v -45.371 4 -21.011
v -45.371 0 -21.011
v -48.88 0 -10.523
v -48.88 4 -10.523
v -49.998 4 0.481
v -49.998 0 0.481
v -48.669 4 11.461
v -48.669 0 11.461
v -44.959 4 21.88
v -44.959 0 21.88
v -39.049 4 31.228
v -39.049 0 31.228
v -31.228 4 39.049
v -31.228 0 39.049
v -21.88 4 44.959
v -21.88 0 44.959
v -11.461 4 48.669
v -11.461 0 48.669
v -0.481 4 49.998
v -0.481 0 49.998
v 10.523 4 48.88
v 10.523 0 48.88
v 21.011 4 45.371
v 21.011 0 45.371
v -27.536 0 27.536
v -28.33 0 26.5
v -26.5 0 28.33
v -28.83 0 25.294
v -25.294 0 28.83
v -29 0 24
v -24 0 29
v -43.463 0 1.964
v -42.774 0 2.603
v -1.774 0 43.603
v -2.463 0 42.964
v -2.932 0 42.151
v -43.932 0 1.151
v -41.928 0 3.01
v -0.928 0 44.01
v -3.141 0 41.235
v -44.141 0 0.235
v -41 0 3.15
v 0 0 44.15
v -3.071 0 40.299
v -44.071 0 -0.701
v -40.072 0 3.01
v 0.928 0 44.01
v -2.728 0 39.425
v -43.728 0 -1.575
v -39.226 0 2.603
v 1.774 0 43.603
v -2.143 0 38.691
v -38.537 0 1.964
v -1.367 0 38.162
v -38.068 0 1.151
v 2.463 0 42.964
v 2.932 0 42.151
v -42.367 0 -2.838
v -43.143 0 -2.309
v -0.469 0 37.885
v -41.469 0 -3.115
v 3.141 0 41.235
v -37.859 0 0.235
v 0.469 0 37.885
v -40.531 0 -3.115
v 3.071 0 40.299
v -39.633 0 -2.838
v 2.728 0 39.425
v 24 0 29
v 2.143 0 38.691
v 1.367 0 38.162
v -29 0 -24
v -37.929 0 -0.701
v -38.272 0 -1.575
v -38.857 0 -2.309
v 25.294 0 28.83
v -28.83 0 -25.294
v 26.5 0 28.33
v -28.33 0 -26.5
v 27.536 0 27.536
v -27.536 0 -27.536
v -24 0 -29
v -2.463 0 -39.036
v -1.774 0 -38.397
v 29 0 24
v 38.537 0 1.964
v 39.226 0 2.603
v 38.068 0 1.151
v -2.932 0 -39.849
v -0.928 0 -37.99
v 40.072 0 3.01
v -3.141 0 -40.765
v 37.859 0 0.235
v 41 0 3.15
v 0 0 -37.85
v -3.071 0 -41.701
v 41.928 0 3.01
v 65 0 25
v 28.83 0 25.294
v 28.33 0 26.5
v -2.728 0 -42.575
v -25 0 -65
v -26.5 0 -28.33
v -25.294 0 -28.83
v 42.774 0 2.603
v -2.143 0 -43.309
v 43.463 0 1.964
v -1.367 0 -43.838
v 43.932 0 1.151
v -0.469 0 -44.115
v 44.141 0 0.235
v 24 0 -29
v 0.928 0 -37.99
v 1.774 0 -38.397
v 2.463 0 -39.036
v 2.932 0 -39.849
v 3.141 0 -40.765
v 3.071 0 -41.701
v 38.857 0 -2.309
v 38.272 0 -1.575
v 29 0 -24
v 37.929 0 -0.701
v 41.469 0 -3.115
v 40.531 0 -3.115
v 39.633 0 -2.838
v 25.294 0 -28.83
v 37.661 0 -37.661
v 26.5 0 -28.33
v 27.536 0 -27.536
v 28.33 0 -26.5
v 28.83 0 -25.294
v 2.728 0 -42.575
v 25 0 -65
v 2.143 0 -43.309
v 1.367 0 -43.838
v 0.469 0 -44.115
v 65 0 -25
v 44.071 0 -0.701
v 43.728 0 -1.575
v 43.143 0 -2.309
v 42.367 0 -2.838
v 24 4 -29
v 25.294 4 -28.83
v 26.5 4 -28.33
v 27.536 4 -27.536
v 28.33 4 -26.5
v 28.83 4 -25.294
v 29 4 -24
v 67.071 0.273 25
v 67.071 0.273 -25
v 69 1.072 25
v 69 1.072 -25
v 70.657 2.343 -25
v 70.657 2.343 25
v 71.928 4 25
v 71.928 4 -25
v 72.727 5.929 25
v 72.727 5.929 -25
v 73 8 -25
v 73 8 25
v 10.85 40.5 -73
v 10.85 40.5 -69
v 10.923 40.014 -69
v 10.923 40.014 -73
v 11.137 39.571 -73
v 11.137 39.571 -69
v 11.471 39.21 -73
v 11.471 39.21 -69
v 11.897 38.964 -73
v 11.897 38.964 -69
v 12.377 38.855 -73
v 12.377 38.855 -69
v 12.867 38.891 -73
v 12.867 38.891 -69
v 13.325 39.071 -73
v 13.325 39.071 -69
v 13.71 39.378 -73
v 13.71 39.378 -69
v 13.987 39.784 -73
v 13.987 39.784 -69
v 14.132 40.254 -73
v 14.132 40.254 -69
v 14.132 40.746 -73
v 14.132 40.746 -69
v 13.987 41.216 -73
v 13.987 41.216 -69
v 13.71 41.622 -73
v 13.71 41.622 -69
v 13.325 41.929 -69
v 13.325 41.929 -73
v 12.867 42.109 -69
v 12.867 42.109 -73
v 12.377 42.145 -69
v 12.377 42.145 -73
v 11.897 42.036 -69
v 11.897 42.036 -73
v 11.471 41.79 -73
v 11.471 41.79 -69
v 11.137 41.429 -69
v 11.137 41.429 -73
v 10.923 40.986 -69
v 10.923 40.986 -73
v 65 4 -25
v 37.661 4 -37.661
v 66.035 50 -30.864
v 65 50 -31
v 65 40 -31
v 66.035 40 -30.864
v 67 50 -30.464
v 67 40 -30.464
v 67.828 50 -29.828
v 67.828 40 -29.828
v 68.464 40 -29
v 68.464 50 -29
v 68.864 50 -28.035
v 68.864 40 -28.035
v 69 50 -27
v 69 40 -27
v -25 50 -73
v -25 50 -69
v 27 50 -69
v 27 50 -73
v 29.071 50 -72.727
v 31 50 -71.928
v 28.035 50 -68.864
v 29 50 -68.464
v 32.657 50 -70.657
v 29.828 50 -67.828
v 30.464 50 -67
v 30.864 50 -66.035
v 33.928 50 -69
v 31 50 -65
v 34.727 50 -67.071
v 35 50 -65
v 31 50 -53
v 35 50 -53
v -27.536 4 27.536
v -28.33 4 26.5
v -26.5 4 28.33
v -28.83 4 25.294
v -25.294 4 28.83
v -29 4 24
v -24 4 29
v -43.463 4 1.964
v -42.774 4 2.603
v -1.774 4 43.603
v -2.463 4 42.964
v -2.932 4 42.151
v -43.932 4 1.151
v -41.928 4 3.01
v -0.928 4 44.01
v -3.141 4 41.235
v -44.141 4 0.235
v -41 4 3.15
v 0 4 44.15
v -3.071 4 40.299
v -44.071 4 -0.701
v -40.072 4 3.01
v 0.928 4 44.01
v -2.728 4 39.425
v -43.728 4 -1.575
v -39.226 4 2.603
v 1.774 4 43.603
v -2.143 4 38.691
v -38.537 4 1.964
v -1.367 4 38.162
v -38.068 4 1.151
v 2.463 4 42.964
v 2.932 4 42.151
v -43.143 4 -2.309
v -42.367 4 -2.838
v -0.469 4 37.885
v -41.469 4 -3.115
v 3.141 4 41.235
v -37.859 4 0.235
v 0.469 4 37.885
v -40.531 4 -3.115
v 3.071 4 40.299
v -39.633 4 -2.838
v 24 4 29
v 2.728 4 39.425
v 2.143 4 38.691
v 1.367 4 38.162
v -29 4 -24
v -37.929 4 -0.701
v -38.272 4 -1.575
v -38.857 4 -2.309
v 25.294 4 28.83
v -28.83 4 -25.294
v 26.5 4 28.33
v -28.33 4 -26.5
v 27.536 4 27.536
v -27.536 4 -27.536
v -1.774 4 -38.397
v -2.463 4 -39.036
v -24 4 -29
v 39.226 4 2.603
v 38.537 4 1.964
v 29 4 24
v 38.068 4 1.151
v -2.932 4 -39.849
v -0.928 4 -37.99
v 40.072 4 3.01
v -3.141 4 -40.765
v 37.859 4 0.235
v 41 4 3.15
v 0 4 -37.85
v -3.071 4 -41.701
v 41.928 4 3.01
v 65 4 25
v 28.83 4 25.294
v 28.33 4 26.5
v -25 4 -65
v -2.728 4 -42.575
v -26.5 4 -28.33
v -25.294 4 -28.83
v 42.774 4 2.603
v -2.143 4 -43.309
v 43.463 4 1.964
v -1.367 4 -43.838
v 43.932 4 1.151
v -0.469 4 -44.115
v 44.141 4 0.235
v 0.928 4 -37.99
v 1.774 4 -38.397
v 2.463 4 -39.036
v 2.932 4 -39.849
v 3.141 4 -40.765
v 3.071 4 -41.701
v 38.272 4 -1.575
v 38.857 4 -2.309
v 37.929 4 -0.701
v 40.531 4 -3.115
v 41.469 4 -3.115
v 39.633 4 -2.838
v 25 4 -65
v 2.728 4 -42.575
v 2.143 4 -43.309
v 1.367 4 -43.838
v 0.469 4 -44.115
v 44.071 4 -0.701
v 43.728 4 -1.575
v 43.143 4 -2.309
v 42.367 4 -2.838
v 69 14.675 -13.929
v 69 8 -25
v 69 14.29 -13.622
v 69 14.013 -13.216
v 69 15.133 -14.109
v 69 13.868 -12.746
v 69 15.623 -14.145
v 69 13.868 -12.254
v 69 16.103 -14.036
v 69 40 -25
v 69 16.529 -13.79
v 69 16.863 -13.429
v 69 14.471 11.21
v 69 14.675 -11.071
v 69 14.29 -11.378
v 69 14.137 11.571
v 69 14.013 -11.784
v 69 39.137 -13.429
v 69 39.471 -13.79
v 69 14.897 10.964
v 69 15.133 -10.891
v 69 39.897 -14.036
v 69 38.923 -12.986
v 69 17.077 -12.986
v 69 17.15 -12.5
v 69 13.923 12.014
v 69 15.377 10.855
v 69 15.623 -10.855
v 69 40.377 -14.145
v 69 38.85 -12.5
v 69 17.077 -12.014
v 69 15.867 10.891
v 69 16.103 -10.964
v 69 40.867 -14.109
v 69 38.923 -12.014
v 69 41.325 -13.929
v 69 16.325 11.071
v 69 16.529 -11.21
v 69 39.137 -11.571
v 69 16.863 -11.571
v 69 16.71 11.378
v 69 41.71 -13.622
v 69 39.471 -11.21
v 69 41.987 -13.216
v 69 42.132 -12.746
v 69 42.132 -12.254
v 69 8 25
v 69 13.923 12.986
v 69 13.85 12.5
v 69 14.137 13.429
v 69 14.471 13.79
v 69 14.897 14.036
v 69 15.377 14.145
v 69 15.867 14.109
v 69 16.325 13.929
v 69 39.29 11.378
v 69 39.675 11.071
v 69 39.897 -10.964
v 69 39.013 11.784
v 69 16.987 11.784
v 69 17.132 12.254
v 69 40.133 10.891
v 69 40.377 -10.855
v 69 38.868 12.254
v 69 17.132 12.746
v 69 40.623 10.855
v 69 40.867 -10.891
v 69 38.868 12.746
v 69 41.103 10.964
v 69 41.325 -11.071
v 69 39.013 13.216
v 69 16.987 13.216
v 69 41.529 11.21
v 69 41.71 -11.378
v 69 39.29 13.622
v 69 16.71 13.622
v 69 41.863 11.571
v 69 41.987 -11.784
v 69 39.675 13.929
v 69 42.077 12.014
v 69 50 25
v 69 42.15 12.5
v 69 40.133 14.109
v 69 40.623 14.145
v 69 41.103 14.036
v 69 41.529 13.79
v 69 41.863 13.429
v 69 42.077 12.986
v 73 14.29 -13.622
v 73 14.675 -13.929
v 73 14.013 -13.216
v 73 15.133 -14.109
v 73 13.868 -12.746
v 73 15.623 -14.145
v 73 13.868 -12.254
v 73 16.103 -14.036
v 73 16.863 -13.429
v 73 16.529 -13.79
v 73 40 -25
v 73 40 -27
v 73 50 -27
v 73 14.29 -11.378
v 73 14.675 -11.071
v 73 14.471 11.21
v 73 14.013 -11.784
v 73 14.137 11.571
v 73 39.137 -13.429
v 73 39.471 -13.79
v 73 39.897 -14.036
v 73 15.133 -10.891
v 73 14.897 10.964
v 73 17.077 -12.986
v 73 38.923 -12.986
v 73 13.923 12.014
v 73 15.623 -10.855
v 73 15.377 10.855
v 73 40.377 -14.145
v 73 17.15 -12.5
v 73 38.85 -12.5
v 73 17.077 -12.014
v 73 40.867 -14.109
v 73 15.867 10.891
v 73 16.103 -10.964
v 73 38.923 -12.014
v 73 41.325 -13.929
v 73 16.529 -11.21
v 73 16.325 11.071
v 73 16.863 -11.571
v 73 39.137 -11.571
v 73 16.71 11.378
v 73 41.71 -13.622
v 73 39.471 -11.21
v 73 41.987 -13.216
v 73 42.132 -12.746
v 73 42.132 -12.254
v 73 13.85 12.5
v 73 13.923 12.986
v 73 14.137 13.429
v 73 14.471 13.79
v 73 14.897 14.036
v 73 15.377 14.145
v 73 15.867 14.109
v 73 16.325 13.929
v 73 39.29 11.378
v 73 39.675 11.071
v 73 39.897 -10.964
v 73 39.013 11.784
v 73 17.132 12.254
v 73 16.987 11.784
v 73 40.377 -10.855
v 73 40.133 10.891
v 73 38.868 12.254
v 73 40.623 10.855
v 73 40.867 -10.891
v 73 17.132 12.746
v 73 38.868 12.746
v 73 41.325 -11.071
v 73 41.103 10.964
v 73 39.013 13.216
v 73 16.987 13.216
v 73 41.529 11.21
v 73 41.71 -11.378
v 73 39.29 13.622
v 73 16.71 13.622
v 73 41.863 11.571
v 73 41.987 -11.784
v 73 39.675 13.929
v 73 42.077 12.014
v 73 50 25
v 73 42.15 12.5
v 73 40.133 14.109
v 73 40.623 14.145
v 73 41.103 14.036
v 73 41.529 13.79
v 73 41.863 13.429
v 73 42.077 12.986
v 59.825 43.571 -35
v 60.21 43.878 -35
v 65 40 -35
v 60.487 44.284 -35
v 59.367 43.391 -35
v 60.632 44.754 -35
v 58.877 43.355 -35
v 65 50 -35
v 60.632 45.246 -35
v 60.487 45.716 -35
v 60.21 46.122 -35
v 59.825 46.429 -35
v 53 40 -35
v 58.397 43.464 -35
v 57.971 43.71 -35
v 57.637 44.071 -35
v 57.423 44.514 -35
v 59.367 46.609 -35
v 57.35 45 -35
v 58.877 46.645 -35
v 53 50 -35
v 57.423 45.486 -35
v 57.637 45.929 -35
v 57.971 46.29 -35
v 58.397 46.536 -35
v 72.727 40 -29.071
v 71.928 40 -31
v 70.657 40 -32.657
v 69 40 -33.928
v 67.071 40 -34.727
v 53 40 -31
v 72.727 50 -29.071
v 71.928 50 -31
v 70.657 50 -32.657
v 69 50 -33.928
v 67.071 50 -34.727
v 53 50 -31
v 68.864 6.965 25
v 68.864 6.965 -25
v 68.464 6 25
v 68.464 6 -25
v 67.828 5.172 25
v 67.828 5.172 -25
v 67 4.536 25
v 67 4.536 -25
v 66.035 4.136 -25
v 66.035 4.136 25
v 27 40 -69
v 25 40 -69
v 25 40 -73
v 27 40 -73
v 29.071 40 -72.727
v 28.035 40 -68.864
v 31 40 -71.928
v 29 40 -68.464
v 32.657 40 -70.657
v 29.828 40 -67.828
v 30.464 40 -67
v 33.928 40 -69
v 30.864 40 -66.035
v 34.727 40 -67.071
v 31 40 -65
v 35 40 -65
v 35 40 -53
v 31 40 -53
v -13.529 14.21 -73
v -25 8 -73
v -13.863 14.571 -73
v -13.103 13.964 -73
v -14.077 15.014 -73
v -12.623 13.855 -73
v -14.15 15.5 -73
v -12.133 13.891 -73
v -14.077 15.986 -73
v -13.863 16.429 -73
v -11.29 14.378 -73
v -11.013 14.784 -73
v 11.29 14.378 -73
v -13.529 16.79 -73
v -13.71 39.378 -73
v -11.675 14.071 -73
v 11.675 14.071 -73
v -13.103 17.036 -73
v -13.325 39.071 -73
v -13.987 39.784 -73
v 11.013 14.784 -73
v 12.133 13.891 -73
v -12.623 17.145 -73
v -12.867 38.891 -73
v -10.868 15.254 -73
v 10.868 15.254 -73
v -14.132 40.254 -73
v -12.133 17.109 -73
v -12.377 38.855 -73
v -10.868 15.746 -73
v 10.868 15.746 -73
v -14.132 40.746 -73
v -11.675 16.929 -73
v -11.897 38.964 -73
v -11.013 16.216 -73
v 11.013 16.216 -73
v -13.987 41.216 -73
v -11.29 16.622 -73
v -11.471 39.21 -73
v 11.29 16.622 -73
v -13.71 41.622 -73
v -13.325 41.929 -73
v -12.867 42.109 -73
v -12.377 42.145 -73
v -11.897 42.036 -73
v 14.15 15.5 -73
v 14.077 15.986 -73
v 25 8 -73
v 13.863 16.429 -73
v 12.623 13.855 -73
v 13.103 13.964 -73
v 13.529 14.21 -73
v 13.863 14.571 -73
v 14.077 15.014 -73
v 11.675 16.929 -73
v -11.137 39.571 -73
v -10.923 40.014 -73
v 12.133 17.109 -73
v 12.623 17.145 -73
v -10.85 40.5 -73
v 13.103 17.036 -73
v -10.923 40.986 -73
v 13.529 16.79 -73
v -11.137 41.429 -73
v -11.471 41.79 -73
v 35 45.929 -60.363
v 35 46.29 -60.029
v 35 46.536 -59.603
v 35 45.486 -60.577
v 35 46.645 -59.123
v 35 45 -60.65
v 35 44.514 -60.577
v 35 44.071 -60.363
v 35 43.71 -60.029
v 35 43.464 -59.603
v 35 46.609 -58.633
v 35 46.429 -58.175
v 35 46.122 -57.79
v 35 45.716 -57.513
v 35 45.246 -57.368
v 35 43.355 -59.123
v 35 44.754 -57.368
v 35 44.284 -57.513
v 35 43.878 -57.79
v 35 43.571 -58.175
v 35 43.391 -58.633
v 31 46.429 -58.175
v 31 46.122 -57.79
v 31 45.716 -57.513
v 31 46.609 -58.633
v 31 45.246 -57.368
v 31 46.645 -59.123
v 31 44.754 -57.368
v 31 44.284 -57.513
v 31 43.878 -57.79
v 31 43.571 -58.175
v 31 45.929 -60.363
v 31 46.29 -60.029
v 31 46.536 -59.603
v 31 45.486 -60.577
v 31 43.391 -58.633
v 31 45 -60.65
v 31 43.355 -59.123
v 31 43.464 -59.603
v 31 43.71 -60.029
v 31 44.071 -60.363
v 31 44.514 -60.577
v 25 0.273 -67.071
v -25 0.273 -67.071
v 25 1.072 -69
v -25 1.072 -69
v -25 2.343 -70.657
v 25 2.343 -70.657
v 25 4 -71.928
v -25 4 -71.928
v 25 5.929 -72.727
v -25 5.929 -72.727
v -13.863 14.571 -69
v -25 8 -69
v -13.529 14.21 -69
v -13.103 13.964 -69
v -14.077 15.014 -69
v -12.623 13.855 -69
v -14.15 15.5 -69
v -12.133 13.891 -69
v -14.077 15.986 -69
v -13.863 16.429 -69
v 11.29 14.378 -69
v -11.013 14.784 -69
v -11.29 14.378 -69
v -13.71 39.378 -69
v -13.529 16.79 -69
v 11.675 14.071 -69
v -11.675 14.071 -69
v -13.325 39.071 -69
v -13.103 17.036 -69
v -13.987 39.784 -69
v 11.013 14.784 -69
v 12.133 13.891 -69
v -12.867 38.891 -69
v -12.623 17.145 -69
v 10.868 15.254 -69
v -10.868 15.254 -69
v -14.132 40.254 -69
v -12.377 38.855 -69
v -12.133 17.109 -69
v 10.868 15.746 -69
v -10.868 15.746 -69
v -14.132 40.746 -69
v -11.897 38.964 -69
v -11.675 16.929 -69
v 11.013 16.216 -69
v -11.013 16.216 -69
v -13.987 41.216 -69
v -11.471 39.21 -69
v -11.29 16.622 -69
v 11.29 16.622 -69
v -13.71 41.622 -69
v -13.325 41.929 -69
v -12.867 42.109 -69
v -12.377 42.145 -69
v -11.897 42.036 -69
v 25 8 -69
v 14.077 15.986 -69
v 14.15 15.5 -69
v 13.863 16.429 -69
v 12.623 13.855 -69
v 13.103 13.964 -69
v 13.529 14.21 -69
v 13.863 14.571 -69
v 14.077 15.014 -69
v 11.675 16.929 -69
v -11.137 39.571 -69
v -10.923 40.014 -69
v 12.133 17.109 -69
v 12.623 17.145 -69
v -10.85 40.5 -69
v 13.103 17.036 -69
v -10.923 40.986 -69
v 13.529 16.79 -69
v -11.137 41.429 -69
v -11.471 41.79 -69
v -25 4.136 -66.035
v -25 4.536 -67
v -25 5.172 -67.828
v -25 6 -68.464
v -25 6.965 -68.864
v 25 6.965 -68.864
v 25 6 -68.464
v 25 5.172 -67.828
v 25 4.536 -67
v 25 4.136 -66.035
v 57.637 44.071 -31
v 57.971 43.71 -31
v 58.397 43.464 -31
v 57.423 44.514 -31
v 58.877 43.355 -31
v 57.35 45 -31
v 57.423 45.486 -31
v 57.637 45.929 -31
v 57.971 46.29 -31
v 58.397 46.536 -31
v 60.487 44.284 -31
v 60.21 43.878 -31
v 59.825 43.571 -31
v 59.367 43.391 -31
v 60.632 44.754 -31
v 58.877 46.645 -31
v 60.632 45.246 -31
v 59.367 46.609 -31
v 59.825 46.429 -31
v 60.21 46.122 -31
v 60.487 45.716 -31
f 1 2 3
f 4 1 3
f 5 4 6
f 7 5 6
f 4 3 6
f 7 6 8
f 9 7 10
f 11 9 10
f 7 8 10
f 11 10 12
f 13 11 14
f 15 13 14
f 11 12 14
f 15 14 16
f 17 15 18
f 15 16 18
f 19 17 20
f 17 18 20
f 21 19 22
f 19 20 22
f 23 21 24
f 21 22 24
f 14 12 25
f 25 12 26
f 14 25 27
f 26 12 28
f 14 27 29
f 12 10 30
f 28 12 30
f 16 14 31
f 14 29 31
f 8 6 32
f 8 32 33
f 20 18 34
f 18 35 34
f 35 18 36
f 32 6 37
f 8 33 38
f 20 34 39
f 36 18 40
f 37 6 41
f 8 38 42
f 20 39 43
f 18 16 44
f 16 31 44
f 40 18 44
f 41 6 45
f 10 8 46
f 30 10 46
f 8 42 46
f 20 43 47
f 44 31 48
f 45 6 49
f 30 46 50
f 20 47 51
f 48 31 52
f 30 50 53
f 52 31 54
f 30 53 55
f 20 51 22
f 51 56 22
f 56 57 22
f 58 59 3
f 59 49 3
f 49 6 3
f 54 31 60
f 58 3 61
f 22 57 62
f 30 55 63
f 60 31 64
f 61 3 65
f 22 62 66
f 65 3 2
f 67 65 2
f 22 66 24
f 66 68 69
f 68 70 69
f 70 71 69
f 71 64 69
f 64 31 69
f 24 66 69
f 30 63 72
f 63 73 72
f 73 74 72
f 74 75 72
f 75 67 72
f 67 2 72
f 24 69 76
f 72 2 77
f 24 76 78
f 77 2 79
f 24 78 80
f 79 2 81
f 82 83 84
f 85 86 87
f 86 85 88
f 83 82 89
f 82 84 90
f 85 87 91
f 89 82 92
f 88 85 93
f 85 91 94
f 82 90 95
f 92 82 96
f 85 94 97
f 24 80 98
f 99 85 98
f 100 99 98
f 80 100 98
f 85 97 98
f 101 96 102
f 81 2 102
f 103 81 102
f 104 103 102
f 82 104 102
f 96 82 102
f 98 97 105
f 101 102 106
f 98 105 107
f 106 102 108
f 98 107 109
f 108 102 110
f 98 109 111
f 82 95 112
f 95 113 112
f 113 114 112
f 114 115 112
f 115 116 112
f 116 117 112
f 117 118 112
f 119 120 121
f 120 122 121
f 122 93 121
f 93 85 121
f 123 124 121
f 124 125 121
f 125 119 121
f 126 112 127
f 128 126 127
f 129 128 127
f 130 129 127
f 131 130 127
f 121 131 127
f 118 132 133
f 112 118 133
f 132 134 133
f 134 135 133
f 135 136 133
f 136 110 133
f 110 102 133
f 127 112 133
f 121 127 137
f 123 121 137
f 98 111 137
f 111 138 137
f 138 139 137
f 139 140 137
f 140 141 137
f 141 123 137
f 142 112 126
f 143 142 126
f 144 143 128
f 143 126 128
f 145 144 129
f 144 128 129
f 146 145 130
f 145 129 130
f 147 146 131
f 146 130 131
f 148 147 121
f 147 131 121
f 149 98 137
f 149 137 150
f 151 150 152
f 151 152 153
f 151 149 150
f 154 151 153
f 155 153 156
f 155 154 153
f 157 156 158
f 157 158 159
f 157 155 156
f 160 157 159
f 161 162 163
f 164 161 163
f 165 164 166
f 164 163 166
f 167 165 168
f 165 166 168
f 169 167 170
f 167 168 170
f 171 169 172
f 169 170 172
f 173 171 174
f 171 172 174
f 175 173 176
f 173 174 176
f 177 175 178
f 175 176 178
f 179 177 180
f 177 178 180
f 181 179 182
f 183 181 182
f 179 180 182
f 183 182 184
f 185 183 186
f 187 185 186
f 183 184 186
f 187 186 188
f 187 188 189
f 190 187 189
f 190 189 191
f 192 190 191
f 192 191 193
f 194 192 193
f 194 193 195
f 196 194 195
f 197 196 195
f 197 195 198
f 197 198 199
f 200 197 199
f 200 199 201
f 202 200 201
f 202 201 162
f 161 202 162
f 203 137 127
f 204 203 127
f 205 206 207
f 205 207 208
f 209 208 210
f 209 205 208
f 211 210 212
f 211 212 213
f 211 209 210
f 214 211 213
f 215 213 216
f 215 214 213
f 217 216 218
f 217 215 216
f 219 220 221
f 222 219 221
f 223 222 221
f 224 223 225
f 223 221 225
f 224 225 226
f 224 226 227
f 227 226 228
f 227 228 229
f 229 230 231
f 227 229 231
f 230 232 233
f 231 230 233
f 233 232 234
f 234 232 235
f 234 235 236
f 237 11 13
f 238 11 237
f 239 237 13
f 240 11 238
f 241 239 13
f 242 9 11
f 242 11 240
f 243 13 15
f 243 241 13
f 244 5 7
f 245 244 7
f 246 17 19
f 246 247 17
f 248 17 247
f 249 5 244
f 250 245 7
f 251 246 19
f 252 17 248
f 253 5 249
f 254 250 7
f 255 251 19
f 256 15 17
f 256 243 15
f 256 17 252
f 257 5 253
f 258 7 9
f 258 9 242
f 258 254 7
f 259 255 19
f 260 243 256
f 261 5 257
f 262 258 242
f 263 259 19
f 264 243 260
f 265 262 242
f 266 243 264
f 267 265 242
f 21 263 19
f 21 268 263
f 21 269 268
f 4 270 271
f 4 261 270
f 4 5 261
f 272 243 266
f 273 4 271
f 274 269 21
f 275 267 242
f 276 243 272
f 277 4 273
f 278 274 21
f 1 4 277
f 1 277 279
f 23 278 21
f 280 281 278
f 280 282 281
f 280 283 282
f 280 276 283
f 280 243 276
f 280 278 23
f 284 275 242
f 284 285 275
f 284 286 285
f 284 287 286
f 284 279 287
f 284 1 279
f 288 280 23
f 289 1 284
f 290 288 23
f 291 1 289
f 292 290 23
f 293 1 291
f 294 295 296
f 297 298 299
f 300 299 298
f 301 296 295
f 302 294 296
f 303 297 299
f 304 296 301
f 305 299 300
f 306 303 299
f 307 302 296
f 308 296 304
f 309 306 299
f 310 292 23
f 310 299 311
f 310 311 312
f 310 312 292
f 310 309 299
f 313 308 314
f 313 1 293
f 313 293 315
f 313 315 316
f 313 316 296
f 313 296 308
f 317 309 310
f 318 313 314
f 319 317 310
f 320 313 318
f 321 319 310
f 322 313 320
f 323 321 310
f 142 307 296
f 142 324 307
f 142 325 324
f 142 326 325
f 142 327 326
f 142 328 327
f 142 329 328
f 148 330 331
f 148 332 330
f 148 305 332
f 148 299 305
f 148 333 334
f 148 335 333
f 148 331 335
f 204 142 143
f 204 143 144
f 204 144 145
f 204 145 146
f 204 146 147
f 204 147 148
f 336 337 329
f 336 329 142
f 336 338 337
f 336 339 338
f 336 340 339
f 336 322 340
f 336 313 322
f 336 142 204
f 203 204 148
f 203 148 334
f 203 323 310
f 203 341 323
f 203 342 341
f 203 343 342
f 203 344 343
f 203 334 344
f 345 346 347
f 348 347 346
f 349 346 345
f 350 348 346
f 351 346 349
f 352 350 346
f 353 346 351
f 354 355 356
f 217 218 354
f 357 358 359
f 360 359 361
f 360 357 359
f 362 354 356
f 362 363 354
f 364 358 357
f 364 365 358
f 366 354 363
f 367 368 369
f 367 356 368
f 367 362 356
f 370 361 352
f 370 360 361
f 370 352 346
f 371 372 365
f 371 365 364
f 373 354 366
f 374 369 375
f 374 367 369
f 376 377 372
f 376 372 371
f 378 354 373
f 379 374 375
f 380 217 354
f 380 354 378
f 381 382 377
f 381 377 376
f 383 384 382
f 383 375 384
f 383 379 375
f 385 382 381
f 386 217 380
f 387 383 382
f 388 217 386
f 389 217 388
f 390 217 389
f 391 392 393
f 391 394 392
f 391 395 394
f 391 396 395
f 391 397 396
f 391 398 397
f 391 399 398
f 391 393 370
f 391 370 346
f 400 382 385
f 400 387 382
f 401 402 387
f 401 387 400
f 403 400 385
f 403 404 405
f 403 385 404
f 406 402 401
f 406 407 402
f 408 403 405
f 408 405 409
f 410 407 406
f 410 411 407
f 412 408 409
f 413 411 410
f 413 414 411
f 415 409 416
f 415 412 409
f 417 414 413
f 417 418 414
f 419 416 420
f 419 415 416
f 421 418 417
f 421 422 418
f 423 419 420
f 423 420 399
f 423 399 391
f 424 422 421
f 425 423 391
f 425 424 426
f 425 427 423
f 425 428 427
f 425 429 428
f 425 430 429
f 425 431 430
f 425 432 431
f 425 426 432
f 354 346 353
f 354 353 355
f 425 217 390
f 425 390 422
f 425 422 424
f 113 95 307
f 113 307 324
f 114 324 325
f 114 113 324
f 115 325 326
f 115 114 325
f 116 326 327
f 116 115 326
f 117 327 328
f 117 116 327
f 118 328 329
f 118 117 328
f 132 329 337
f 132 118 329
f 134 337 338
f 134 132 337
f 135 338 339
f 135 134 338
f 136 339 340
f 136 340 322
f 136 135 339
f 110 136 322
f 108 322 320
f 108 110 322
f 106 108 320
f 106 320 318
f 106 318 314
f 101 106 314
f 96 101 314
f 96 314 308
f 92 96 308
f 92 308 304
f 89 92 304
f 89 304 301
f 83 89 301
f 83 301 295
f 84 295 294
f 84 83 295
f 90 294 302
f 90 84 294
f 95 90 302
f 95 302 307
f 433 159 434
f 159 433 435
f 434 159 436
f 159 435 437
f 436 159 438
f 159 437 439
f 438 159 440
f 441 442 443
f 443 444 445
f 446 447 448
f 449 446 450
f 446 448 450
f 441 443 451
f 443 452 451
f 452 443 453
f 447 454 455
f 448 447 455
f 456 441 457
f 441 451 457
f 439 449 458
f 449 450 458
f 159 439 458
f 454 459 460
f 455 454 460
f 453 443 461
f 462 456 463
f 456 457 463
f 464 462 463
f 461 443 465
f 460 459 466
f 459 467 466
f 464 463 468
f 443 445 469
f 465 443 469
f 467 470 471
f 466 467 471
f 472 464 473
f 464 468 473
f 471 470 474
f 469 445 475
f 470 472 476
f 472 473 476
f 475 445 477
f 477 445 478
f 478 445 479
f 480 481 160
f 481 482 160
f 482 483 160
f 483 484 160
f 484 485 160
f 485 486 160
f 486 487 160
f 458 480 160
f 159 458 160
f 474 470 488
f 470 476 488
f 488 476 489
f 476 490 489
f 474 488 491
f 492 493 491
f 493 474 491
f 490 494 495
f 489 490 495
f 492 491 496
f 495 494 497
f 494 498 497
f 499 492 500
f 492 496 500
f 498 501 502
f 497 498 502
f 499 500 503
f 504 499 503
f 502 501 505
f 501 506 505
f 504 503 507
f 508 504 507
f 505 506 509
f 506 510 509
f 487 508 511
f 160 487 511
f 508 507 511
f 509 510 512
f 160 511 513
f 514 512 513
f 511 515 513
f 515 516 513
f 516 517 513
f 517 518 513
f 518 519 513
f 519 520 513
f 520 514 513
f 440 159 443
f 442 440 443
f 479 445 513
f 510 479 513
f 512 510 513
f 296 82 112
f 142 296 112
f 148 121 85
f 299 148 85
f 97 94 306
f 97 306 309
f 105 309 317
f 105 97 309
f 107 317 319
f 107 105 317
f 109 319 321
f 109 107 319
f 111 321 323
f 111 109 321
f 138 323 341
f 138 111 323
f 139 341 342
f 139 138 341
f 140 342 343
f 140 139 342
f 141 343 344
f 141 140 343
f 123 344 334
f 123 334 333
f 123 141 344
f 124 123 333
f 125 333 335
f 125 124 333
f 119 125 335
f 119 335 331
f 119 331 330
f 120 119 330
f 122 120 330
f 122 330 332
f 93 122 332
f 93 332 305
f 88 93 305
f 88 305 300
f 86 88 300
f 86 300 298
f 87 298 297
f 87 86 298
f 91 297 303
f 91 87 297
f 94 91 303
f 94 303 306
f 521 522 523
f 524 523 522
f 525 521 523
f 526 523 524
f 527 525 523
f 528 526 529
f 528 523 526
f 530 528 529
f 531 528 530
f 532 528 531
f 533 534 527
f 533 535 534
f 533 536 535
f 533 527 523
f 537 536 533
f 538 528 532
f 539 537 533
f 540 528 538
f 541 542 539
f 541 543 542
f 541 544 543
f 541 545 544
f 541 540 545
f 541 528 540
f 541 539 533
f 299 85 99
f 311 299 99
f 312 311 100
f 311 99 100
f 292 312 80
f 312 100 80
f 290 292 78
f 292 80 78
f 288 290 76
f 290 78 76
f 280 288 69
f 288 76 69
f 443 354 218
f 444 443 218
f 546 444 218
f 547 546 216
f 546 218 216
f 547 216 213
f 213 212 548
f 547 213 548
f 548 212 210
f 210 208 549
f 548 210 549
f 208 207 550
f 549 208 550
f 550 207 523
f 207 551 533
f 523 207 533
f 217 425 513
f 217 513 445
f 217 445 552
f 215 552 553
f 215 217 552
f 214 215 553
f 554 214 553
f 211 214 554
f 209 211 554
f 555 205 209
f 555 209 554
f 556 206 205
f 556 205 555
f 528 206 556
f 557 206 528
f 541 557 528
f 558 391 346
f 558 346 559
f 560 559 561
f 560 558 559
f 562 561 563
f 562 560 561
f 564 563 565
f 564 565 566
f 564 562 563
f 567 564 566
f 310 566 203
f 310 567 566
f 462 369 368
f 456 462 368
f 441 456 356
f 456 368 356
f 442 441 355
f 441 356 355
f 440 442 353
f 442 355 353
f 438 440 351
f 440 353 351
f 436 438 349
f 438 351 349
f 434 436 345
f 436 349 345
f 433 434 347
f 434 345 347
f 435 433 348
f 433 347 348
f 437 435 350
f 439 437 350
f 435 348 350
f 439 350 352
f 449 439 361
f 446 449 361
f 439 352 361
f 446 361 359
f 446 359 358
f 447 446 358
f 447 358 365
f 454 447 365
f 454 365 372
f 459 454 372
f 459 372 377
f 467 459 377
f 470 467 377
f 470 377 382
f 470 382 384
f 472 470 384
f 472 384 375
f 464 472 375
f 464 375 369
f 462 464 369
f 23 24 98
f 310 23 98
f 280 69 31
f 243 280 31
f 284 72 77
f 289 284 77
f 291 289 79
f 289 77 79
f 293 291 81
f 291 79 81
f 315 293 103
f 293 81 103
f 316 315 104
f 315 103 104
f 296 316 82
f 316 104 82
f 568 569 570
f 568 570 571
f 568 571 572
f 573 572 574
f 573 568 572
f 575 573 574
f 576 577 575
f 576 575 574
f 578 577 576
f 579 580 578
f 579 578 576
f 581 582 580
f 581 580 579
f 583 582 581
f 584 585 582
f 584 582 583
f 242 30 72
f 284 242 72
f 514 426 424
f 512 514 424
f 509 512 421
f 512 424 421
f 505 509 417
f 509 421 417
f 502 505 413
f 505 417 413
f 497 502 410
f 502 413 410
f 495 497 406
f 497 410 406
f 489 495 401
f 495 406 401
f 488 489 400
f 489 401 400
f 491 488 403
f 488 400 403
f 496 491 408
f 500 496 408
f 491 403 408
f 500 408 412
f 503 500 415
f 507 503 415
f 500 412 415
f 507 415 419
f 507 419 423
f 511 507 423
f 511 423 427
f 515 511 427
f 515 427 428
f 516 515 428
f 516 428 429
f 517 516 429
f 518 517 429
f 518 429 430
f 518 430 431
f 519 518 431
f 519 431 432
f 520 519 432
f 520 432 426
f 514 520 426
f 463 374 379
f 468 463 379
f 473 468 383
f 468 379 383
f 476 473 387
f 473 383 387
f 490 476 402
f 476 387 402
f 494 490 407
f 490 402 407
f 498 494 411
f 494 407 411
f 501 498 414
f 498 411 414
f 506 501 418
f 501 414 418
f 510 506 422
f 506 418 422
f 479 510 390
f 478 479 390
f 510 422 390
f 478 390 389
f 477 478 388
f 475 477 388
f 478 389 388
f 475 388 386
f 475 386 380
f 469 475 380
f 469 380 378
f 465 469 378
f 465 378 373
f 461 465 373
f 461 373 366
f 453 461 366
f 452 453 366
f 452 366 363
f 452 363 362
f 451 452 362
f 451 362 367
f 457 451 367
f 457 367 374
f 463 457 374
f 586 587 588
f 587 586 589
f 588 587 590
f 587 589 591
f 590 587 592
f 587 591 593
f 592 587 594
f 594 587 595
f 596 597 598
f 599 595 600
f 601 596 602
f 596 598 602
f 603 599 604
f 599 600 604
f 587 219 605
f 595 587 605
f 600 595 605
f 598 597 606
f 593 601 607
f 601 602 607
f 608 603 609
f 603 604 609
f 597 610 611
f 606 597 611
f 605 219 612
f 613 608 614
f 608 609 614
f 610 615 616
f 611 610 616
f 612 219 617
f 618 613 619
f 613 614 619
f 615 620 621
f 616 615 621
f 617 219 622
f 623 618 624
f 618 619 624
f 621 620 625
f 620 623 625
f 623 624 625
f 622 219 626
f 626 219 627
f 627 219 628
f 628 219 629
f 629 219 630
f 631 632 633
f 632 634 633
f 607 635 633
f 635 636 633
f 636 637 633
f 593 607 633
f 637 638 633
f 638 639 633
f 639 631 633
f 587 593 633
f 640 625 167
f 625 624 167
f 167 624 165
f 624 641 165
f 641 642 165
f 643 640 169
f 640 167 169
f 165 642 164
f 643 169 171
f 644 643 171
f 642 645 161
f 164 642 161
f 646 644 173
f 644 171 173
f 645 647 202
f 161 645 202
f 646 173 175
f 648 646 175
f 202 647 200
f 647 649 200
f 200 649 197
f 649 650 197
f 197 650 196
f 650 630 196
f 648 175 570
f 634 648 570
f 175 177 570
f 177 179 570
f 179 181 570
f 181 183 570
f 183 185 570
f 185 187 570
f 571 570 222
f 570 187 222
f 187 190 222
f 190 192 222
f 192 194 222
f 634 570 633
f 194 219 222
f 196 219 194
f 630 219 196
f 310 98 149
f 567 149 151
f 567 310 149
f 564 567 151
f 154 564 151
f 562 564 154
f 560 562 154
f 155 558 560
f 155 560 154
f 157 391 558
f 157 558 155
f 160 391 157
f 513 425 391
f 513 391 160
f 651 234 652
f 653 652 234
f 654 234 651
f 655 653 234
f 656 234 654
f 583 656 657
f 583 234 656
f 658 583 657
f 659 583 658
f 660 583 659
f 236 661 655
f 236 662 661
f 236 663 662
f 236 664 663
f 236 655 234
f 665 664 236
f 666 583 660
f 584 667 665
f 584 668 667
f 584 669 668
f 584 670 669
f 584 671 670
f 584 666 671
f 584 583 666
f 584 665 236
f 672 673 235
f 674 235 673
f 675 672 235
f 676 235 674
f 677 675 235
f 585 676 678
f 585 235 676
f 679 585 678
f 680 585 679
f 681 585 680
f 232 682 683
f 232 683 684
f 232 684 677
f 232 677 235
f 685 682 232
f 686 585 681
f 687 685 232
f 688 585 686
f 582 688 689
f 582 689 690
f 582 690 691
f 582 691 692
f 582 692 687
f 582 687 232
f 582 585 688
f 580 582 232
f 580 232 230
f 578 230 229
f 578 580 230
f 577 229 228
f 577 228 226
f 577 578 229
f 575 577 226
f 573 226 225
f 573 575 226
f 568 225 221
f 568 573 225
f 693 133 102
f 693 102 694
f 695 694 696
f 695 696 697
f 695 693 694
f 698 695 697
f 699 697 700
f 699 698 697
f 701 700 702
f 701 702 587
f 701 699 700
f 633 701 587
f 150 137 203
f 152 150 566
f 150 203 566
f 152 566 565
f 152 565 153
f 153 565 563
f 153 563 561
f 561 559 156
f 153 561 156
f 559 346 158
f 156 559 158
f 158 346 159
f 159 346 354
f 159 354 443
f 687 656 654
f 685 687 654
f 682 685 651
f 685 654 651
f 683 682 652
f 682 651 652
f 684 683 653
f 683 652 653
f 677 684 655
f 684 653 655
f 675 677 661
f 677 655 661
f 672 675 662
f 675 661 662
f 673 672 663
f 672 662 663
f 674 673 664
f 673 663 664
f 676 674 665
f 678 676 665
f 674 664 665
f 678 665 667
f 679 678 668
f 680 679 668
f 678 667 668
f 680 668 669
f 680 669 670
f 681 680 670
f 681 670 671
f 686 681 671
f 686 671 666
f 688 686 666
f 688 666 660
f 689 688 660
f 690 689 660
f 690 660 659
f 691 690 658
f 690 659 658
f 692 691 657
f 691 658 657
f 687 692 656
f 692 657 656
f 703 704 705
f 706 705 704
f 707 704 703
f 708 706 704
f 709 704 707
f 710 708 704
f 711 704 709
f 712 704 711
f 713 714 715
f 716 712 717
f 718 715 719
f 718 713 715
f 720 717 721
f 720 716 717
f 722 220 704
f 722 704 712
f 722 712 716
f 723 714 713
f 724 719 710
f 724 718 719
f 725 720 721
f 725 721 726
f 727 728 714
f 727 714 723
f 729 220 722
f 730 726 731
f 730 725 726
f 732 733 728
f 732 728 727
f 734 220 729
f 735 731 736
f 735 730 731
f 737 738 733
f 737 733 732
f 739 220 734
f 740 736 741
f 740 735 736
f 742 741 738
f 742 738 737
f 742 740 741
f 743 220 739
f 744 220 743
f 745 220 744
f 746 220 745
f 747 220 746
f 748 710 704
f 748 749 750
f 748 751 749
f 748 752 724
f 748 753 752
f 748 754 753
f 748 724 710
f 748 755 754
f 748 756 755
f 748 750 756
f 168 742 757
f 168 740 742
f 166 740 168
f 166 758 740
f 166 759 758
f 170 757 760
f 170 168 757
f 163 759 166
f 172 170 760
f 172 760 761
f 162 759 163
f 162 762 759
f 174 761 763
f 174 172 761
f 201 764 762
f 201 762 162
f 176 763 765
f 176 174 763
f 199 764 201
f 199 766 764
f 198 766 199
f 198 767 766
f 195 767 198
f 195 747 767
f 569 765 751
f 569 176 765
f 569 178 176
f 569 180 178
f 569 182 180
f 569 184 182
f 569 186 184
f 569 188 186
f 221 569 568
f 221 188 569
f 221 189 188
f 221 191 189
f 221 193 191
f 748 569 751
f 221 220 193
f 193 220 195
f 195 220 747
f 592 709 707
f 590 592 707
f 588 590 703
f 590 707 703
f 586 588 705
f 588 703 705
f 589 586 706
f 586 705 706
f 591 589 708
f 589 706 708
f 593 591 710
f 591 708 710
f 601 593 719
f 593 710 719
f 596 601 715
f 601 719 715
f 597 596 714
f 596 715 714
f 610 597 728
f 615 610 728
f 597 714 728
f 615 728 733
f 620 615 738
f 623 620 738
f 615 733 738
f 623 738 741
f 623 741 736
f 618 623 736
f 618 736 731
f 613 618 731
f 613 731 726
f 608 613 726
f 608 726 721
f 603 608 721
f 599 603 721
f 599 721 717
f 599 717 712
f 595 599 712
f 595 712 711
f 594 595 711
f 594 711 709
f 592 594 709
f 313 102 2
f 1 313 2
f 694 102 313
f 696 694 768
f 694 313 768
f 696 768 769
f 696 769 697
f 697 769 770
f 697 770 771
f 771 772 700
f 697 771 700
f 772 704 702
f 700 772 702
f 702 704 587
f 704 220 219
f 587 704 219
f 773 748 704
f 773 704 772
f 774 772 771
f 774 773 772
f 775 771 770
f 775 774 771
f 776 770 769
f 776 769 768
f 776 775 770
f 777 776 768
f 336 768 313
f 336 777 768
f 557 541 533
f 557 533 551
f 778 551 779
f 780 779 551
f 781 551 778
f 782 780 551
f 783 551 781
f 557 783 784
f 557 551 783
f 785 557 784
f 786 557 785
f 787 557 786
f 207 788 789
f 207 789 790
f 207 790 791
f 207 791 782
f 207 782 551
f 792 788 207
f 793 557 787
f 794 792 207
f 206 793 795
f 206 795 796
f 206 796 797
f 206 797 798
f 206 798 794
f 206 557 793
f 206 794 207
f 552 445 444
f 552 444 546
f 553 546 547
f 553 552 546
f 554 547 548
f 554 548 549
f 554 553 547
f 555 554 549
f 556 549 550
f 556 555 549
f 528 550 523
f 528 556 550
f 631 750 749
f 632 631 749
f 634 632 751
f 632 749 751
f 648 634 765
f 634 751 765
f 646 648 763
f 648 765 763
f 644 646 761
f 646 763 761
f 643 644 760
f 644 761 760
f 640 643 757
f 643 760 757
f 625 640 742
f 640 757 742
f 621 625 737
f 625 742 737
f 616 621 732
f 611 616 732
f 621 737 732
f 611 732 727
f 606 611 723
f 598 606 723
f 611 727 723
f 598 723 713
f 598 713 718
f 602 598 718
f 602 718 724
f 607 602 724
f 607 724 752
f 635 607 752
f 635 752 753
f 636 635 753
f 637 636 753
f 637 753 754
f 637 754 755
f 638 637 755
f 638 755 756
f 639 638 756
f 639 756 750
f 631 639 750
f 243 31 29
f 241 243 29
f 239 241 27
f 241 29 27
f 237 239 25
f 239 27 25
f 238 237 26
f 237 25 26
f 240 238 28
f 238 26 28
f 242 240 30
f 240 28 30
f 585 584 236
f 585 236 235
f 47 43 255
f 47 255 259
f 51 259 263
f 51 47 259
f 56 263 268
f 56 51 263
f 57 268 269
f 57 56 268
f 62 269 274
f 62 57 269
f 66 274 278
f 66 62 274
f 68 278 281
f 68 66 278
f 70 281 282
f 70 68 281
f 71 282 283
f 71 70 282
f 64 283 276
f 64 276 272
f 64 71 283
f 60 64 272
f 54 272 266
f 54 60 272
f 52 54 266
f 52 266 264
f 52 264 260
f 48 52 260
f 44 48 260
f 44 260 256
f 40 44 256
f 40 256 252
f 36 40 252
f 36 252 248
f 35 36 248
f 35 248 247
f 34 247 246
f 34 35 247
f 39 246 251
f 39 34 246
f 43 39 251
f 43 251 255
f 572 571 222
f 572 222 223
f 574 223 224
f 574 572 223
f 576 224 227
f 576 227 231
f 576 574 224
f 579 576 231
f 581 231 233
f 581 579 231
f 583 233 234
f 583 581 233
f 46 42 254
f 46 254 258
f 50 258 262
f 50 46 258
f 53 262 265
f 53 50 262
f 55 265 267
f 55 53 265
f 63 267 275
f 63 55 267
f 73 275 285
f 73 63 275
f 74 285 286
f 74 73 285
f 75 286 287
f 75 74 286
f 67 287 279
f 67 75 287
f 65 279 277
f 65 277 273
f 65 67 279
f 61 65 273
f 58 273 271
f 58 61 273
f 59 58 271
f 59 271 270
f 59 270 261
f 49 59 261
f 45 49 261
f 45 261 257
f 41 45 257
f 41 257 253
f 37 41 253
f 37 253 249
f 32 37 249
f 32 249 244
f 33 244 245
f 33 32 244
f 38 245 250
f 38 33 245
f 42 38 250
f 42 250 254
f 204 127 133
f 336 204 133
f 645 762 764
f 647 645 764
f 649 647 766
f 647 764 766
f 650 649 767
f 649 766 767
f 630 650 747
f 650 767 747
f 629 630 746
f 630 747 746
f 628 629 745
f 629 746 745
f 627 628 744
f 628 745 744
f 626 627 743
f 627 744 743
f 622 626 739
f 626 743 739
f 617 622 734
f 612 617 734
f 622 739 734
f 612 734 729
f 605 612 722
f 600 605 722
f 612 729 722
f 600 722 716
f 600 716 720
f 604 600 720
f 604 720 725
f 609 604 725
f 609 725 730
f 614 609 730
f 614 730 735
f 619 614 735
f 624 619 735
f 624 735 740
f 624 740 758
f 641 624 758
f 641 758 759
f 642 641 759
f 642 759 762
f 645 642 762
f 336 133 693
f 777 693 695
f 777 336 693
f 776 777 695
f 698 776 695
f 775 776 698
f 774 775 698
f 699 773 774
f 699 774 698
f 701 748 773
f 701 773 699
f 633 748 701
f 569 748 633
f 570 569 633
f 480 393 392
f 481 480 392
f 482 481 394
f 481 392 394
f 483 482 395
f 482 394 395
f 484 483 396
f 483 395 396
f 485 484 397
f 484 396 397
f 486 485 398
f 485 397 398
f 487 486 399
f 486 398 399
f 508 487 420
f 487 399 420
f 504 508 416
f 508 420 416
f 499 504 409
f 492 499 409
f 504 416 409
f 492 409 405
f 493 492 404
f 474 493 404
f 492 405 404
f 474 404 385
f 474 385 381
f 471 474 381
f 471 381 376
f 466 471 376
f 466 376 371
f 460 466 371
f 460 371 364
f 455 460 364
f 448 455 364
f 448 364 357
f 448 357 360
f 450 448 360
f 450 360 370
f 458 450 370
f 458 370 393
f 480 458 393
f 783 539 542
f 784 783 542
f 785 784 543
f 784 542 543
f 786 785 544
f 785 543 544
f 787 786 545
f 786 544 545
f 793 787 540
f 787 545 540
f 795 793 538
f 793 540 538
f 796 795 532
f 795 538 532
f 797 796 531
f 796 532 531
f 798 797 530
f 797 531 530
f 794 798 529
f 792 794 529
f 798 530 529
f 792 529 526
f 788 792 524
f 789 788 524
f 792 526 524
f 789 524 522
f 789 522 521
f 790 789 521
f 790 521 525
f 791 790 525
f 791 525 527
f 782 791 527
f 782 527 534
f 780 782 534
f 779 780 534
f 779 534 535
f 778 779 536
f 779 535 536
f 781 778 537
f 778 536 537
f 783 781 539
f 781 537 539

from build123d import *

# Parameters (mm, degrees)
SKETCH_1_R                         = 3.15
EXTRUDE_1_DEPTH                    = 4
SM_EDGE_FLANGE_1_DEPTH             = 50
SM_EDGE_FLANGE_1_BEND_DEPTH        = 50
SKETCH_25_W                        = 10
SKETCH_25_H                        = 10
EXTRUDE_3_DEPTH                    = 4
SKETCH_23_W                        = 10
SKETCH_23_H                        = 10
EXTRUDE_2_DEPTH                    = 4
SKETCH_21_R                        = 1.65
CUT_EXTRUDE_1_DEPTH                = 149.290255917
SKETCH_22_R                        = 1.65
CUT_EXTRUDE_2_DEPTH                = 149.290255917
SM_EDGE_FLANGE_2_STRIP_W           = 24
SM_EDGE_FLANGE_2_STRIP_H           = 4
SM_EDGE_FLANGE_2_STRIP_CUT_DEPTH   = 10
SM_EDGE_FLANGE_2_STRIP_2_W         = 24
SM_EDGE_FLANGE_2_STRIP_2_H         = 4
SM_EDGE_FLANGE_2_STRIP_CUT_2_DEPTH = 10
SM_EDGE_FLANGE_2_DEPTH             = 10
SM_EDGE_FLANGE_2_BEND_DEPTH        = 10
SKETCH_38_R                        = 1.65
CUT_EXTRUDE_3_DEPTH                = 4
SKETCH_37_R                        = 1.65
CUT_EXTRUDE_4_DEPTH                = 4


# Sheet-metal steps are written as plain solids
with BuildPart() as part:
    # Sketch 1 → 凸台-拉伸1 (new body)
    with BuildSketch(Plane(origin=(0, 0, 0), x_dir=(1, 0, 0), z_dir=(0, 1, 0))):
        with BuildLine():
            Line((-25, 65), (-45.371050591, 21.011134388))
            ThreePointArc((-45.371050591, 21.011134388), (-35.355339059, -35.355339059), (21.011134388, -45.371050591))
            Line((21.011134388, -45.371050591), (65, -25))
            Line((65, -25), (65, 25))
            Line((65, 25), (37.660706721, 37.660706721))
            Line((37.660706721, 37.660706721), (25, 65))
            Line((25, 65), (-25, 65))
        make_face()
        with Locations(Location((0, 41, 0), (0, 0, 270))):
            Circle(SKETCH_1_R, mode=Mode.SUBTRACT)
        with Locations(Location((0, -41, 0), (0, 0, 270))):
            Circle(SKETCH_1_R, mode=Mode.SUBTRACT)
        with Locations(Location((-41, 0, 0), (0, 0, 270))):
            Circle(SKETCH_1_R, mode=Mode.SUBTRACT)
        with BuildLine():
            ThreePointArc((29, -24), (27.535533906, -27.535533906), (24, -29))
            Line((24, -29), (-24, -29))
            ThreePointArc((-24, -29), (-27.535533906, -27.535533906), (-29, -24))
            Line((-29, -24), (-29, 24))
            ThreePointArc((-29, 24), (-27.535533906, 27.535533906), (-24, 29))
            Line((-24, 29), (24, 29))
            ThreePointArc((24, 29), (27.535533906, 27.535533906), (29, 24))
            Line((29, 24), (29, -24))
        make_face(mode=Mode.SUBTRACT)
        with Locations(Location((41, 0, 0), (0, 0, 270))):
            Circle(SKETCH_1_R, mode=Mode.SUBTRACT)
    extrude(amount=EXTRUDE_1_DEPTH)

    # 边线-法兰1 section (across the edge) → 边线-法兰1 (add)
    with BuildSketch(Plane(origin=(69, 4, 25), x_dir=(-1, 0, 0), z_dir=(0, 0, -1))):
        with BuildLine():
            Line((-4, 4), (-4, 46))
            Line((-4, 46), (0, 46))
            Line((0, 46), (0, 4))
            ThreePointArc((0, 4), (1.171572875, 1.171572875), (4, 0))
            Line((4, 0), (4, -4))
            ThreePointArc((4, -4), (-1.656854249, -1.656854249), (-4, 4))
        make_face()
    extrude(amount=SM_EDGE_FLANGE_1_DEPTH)

    # 边线-法兰1 section 2 (across the edge) → 边线-法兰1 bend (add)
    with BuildSketch(Plane(origin=(25, 4, -69), x_dir=(0, 0, 1), z_dir=(-1, 0, 0))):
        with BuildLine():
            Line((-4, 4), (-4, 46))
            Line((-4, 46), (0, 46))
            Line((0, 46), (0, 4))
            ThreePointArc((0, 4), (1.171572875, 1.171572875), (4, 0))
            Line((4, 0), (4, -4))
            ThreePointArc((4, -4), (-1.656854249, -1.656854249), (-4, 4))
        make_face()
    extrude(amount=SM_EDGE_FLANGE_1_BEND_DEPTH)

    # 草图25 → 凸台-拉伸3 (add)
    with BuildSketch(Plane.XY.offset(-69)):
        with Locations((30, 45)):
            Rectangle(SKETCH_25_W, SKETCH_25_H)
    extrude(amount=-EXTRUDE_3_DEPTH)

    # 草图23 → 凸台-拉伸2 (add)
    with BuildSketch(Plane.ZY.offset(-69)):
        with Locations((-30, 45)):
            Rectangle(SKETCH_23_W, SKETCH_23_H)
    extrude(amount=-EXTRUDE_2_DEPTH)

    # 草图21 → 切除-拉伸1 (cut, through all)
    with BuildSketch(Plane.XY.offset(-69)):
        with Locations((-12.5, 40.5)):
            Circle(SKETCH_21_R)
        with Locations(Location((12.5, 40.5, 0), (0, 0, 180))):
            Circle(SKETCH_21_R)
        with Locations((12.5, 15.5)):
            Circle(SKETCH_21_R)
        with Locations(Location((-12.5, 15.5, 0), (0, 0, 180))):
            Circle(SKETCH_21_R)
    extrude(amount=-CUT_EXTRUDE_1_DEPTH, mode=Mode.SUBTRACT)

    # 草图22 → 切除-拉伸2 (cut, through all)
    with BuildSketch(Plane.ZY.offset(-69)):
        with Locations(Location((-12.5, 40.5, 0), (0, 0, 270))):
            Circle(SKETCH_22_R)
        with Locations(Location((12.5, 40.5, 0), (0, 0, 90))):
            Circle(SKETCH_22_R)
        with Locations(Location((12.5, 15.5, 0), (0, 0, 270))):
            Circle(SKETCH_22_R)
        with Locations(Location((-12.5, 15.5, 0), (0, 0, 90))):
            Circle(SKETCH_22_R)
    extrude(amount=-CUT_EXTRUDE_2_DEPTH, mode=Mode.SUBTRACT)

    # 边线-法兰2 strip (across the edge) → 边线-法兰2 strip cut (cut)
    with BuildSketch(Plane(origin=(69, 50, -35), x_dir=(0, 0, 1), z_dir=(0, -1, 0))):
        with Locations((-4, -2)):
            Rectangle(SM_EDGE_FLANGE_2_STRIP_W, SM_EDGE_FLANGE_2_STRIP_H)
    extrude(amount=SM_EDGE_FLANGE_2_STRIP_CUT_DEPTH, mode=Mode.SUBTRACT)

    # 边线-法兰2 strip 2 (across the edge) → 边线-法兰2 strip cut 2 (cut)
    with BuildSketch(Plane(origin=(35, 40, -69), x_dir=(-1, 0, 0), z_dir=(0, 1, 0))):
        with Locations((-4, -2)):
            Rectangle(SM_EDGE_FLANGE_2_STRIP_2_W, SM_EDGE_FLANGE_2_STRIP_2_H)
    extrude(amount=SM_EDGE_FLANGE_2_STRIP_CUT_2_DEPTH, mode=Mode.SUBTRACT)

    # 边线-法兰2 section (across the edge) → 边线-法兰2 (add)
    with BuildSketch(Plane(origin=(69, 50, -35), x_dir=(0, 0, 1), z_dir=(0, -1, 0))):
        with BuildLine():
            Line((0, 4), (0, 16))
            Line((0, 16), (4, 16))
            Line((4, 16), (4, 4))
            ThreePointArc((4, 4), (5.171572875, 1.171572875), (8, 0))
            Line((8, 0), (8, -4))
            ThreePointArc((8, -4), (2.343145751, -1.656854249), (0, 4))
        make_face()
    extrude(amount=SM_EDGE_FLANGE_2_DEPTH)

    # 边线-法兰2 section 2 (across the edge) → 边线-法兰2 bend (add)
    with BuildSketch(Plane(origin=(35, 40, -69), x_dir=(-1, 0, 0), z_dir=(0, 1, 0))):
        with BuildLine():
            Line((0, 4), (0, 16))
            Line((0, 16), (4, 16))
            Line((4, 16), (4, 4))
            ThreePointArc((4, 4), (5.171572875, 1.171572875), (8, 0))
            Line((8, 0), (8, -4))
            ThreePointArc((8, -4), (2.343145751, -1.656854249), (0, 4))
        make_face()
    extrude(amount=SM_EDGE_FLANGE_2_BEND_DEPTH)

    # 草图38 → 切除-拉伸3 (cut)
    with BuildSketch(Plane(origin=(0, 0, -35), x_dir=(-1, 0, 0), z_dir=(0, 0, -1))):
        with Locations((-59, 45)):
            Circle(SKETCH_38_R)
    extrude(amount=-CUT_EXTRUDE_3_DEPTH, mode=Mode.SUBTRACT)

    # 草图37 → 切除-拉伸4 (cut)
    with BuildSketch(Plane(origin=(35, 0, 0), x_dir=(0, 0, -1), z_dir=(1, 0, 0))):
        with Locations((59, 45)):
            Circle(SKETCH_37_R)
    extrude(amount=-CUT_EXTRUDE_4_DEPTH, mode=Mode.SUBTRACT)


solid = part.part
